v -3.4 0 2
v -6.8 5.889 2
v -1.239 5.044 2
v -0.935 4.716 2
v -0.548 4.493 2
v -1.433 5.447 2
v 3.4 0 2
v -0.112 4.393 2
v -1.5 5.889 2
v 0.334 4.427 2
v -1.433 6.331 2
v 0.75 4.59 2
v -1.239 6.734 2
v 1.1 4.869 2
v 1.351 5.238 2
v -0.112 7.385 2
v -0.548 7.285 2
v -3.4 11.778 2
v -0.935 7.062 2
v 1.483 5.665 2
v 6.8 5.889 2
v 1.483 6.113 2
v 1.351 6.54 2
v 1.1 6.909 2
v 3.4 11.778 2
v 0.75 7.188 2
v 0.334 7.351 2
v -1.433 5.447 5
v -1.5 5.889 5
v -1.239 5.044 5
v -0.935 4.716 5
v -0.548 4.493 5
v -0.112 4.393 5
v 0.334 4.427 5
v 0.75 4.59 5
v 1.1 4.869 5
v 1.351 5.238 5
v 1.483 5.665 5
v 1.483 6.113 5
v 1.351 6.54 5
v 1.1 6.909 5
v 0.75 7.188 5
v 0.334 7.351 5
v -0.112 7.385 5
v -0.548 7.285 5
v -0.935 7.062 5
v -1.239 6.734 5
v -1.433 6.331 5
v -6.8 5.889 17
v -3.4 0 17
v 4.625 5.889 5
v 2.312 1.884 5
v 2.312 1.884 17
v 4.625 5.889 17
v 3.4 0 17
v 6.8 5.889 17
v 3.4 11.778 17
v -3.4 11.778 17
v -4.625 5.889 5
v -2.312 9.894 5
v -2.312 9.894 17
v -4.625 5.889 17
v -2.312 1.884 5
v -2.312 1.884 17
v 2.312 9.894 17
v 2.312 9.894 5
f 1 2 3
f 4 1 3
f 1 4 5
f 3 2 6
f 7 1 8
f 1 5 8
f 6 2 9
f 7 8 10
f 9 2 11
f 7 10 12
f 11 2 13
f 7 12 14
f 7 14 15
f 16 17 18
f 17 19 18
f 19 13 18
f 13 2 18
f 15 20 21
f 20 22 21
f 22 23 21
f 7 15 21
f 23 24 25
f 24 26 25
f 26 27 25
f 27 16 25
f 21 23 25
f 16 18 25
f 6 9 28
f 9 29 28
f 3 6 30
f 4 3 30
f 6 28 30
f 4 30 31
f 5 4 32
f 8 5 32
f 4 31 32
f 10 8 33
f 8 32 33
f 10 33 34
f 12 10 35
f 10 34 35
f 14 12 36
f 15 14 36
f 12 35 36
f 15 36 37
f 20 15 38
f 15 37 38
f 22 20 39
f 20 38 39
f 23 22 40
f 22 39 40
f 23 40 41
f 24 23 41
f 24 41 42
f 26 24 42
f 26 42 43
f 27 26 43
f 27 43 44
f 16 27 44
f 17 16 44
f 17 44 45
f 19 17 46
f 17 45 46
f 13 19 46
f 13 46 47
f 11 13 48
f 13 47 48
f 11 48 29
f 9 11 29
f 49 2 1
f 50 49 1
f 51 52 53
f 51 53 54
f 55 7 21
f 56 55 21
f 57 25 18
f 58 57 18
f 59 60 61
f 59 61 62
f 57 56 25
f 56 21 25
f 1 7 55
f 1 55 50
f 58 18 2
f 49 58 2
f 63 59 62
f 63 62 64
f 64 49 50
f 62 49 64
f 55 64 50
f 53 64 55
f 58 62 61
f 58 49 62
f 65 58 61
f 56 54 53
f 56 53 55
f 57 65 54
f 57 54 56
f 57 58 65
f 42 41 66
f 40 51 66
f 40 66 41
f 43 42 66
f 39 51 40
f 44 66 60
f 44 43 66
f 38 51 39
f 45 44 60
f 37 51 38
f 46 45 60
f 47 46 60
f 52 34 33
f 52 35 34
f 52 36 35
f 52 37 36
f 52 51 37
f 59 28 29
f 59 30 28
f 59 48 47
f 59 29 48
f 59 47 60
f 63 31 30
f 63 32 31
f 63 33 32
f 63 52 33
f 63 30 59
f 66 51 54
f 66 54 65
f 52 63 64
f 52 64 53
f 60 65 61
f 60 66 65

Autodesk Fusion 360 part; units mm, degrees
sketch "Sketch1" plane through (0, 0, 0) normal (0, 0, 1) x (1, 0, 0)
  line L0 (0, 0) -> (3.4, 0)
  line L1 (3.4, 0) -> (6.8, 5.889)
  line L2 (6.8, 5.889) -> (3.4, 11.7779)
  line L3 (3.4, 11.7779) -> (-3.4, 11.7779)
  line L4 (-3.4, 11.7779) -> (-6.8, 5.889)
  line L5 (-6.8, 5.889) -> (-3.4, 0)
  line L6 (-3.4, 0) -> (3.4, 0)
  point P0 (0, 5.889)
  dimension "d1" = 3.4
  dimension "d2" = 6.8
extrude "Extrude1" add sketch "Sketch1" along normal blind 10
sketch "Sketch2" plane through (0, 0, 10) normal (0, 0, 1) x (-1, 0, 0)
  line L0 (3.4, 0) -> (-3.4, 0)
  line L1 (-3.4, 0) -> (-6.8, -5.889)
  line L2 (-6.8, -5.889) -> (-3.4, -11.7779)
  line L3 (-3.4, -11.7779) -> (3.4, -11.7779)
  line L4 (3.4, -11.7779) -> (6.8, -5.889)
  line L5 (6.8, -5.889) -> (3.4, 0)
  line L6 (-3.4, 0) -> (3.4, -11.7779)
  line L7 (-3.4, 0) -> (0, -5.889)
  line L8 (0, -5.889) -> (-2.05, -2.3383)
  line L9 (-2.05, -2.3383) -> (-4.1, -5.889)
  line L10 (-4.1, -5.889) -> (-2.05, -9.4397)
  line L11 (-2.05, -9.4397) -> (2.05, -9.4397)
  line L12 (2.05, -9.4397) -> (4.1, -5.889)
  line L13 (4.1, -5.889) -> (2.05, -2.3383)
  line L14 (2.05, -2.3383) -> (-2.05, -2.3383)
  line L15 (-2.05, -2.3383) -> (-2.0499, -2.3383) construction
  point P0 (0.025, -5.9323)
  point P1 (0, -5.889)
  dimension "d10" = 6.8
  dimension "d11" = 4.1
  dimension "d12" = 4.1
  dimension "d13" = 0
extrude "Extrude2" add sketch "Sketch2" along normal blind 5 contours L6 L7 L8 L12 L13 L14 | L6 L7 L8 L9 L10 L11
extrude "Extrude3" add 1 faces at (-0.6833, 0.7794, 10) along direction (0, 0, 1) blind 6
extrude "Extrude4" cut 1 faces at (0.6833, 4.7054, 15) along direction (0, 0, -1) blind 10
extrude "Extrude5" cut 1 faces at (-0.6833, 0.7794, 16) along direction (0, 0, -1) blind 1
sketch "Sketch3" plane through (0, 0, 5) normal (0, 0, 1) x (-1, 0, 0)
  line L0 (2.05, -2.3383) -> (-2.05, -2.3383)
  line L1 (-2.05, -2.3383) -> (-4.1, -5.889)
  line L2 (-4.1, -5.889) -> (-2.05, -9.4397)
  line L3 (-2.05, -9.4397) -> (2.05, -9.4397)
  line L4 (2.05, -9.4397) -> (4.1, -5.889)
  line L5 (4.1, -5.889) -> (2.05, -2.3383)
  line L6 (-2.05, -9.4397) -> (0, -5.889)
  circle A0 centre (0, -5.889) radius 1.5
  dimension "d22" = 3
extrude "Extrude6" cut sketch "Sketch3" against normal blind 5 contours A0
sketch "Sketch4" plane through (0, 0, 15) normal (0, 0, 1) x (-1, 0, 0)
  line L0 (2.05, -2.3383) -> (4.1, -5.889)
  line L1 (4.1, -5.889) -> (2.05, -9.4397)
  line L2 (2.05, -9.4397) -> (-2.05, -9.4397)
  line L3 (-2.05, -9.4397) -> (-4.1, -5.889)
  line L4 (-4.1, -5.889) -> (-2.05, -2.3383)
  line L5 (-2.05, -2.3383) -> (2.05, -2.3383)
  line L6 (3.4, 0) -> (-3.4, 0)
  line L7 (-3.4, 0) -> (-6.8, -5.889)
  line L8 (-6.8, -5.889) -> (-3.4, -11.7779)
  line L9 (-3.4, -11.7779) -> (3.4, -11.7779)
  line L10 (3.4, -11.7779) -> (6.8, -5.889)
  line L11 (6.8, -5.889) -> (3.4, 0)
  line L12 (-2.05, -2.3383) -> (2.05, -9.4397)
  line L13 (2.05, -9.4397) -> (0, -5.889)
  line L14 (-2.05, -2.3383) -> (0, -5.889)
  line L15 (0, -5.889) -> (-2.3125, -1.8836)
  line L16 (-2.3125, -1.8836) -> (-4.625, -5.889)
  line L17 (-4.625, -5.889) -> (-2.3125, -9.8943)
  line L18 (-2.3125, -9.8943) -> (2.3125, -9.8943)
  line L19 (2.3125, -9.8943) -> (4.625, -5.889)
  line L20 (4.625, -5.889) -> (2.3125, -1.8836)
  line L21 (2.3125, -1.8836) -> (-2.3125, -1.8836)
  point P0 (0, -5.889)
  dimension "d25" = 4.625
  dimension "d26" = 4.625
extrude "Extrude7" cut sketch "Sketch4" against normal blind 10 contours L16 L17 L18 L19 L20 L21
extrude "Extrude8" cut 1 faces at (0.0374, 1.4644, 0) along direction (0, 0, 1) blind 2
extrude "Extrude9" add 1 faces at (0.7708, 0.6279, 15) along direction (0, 0, 1) blind 2
